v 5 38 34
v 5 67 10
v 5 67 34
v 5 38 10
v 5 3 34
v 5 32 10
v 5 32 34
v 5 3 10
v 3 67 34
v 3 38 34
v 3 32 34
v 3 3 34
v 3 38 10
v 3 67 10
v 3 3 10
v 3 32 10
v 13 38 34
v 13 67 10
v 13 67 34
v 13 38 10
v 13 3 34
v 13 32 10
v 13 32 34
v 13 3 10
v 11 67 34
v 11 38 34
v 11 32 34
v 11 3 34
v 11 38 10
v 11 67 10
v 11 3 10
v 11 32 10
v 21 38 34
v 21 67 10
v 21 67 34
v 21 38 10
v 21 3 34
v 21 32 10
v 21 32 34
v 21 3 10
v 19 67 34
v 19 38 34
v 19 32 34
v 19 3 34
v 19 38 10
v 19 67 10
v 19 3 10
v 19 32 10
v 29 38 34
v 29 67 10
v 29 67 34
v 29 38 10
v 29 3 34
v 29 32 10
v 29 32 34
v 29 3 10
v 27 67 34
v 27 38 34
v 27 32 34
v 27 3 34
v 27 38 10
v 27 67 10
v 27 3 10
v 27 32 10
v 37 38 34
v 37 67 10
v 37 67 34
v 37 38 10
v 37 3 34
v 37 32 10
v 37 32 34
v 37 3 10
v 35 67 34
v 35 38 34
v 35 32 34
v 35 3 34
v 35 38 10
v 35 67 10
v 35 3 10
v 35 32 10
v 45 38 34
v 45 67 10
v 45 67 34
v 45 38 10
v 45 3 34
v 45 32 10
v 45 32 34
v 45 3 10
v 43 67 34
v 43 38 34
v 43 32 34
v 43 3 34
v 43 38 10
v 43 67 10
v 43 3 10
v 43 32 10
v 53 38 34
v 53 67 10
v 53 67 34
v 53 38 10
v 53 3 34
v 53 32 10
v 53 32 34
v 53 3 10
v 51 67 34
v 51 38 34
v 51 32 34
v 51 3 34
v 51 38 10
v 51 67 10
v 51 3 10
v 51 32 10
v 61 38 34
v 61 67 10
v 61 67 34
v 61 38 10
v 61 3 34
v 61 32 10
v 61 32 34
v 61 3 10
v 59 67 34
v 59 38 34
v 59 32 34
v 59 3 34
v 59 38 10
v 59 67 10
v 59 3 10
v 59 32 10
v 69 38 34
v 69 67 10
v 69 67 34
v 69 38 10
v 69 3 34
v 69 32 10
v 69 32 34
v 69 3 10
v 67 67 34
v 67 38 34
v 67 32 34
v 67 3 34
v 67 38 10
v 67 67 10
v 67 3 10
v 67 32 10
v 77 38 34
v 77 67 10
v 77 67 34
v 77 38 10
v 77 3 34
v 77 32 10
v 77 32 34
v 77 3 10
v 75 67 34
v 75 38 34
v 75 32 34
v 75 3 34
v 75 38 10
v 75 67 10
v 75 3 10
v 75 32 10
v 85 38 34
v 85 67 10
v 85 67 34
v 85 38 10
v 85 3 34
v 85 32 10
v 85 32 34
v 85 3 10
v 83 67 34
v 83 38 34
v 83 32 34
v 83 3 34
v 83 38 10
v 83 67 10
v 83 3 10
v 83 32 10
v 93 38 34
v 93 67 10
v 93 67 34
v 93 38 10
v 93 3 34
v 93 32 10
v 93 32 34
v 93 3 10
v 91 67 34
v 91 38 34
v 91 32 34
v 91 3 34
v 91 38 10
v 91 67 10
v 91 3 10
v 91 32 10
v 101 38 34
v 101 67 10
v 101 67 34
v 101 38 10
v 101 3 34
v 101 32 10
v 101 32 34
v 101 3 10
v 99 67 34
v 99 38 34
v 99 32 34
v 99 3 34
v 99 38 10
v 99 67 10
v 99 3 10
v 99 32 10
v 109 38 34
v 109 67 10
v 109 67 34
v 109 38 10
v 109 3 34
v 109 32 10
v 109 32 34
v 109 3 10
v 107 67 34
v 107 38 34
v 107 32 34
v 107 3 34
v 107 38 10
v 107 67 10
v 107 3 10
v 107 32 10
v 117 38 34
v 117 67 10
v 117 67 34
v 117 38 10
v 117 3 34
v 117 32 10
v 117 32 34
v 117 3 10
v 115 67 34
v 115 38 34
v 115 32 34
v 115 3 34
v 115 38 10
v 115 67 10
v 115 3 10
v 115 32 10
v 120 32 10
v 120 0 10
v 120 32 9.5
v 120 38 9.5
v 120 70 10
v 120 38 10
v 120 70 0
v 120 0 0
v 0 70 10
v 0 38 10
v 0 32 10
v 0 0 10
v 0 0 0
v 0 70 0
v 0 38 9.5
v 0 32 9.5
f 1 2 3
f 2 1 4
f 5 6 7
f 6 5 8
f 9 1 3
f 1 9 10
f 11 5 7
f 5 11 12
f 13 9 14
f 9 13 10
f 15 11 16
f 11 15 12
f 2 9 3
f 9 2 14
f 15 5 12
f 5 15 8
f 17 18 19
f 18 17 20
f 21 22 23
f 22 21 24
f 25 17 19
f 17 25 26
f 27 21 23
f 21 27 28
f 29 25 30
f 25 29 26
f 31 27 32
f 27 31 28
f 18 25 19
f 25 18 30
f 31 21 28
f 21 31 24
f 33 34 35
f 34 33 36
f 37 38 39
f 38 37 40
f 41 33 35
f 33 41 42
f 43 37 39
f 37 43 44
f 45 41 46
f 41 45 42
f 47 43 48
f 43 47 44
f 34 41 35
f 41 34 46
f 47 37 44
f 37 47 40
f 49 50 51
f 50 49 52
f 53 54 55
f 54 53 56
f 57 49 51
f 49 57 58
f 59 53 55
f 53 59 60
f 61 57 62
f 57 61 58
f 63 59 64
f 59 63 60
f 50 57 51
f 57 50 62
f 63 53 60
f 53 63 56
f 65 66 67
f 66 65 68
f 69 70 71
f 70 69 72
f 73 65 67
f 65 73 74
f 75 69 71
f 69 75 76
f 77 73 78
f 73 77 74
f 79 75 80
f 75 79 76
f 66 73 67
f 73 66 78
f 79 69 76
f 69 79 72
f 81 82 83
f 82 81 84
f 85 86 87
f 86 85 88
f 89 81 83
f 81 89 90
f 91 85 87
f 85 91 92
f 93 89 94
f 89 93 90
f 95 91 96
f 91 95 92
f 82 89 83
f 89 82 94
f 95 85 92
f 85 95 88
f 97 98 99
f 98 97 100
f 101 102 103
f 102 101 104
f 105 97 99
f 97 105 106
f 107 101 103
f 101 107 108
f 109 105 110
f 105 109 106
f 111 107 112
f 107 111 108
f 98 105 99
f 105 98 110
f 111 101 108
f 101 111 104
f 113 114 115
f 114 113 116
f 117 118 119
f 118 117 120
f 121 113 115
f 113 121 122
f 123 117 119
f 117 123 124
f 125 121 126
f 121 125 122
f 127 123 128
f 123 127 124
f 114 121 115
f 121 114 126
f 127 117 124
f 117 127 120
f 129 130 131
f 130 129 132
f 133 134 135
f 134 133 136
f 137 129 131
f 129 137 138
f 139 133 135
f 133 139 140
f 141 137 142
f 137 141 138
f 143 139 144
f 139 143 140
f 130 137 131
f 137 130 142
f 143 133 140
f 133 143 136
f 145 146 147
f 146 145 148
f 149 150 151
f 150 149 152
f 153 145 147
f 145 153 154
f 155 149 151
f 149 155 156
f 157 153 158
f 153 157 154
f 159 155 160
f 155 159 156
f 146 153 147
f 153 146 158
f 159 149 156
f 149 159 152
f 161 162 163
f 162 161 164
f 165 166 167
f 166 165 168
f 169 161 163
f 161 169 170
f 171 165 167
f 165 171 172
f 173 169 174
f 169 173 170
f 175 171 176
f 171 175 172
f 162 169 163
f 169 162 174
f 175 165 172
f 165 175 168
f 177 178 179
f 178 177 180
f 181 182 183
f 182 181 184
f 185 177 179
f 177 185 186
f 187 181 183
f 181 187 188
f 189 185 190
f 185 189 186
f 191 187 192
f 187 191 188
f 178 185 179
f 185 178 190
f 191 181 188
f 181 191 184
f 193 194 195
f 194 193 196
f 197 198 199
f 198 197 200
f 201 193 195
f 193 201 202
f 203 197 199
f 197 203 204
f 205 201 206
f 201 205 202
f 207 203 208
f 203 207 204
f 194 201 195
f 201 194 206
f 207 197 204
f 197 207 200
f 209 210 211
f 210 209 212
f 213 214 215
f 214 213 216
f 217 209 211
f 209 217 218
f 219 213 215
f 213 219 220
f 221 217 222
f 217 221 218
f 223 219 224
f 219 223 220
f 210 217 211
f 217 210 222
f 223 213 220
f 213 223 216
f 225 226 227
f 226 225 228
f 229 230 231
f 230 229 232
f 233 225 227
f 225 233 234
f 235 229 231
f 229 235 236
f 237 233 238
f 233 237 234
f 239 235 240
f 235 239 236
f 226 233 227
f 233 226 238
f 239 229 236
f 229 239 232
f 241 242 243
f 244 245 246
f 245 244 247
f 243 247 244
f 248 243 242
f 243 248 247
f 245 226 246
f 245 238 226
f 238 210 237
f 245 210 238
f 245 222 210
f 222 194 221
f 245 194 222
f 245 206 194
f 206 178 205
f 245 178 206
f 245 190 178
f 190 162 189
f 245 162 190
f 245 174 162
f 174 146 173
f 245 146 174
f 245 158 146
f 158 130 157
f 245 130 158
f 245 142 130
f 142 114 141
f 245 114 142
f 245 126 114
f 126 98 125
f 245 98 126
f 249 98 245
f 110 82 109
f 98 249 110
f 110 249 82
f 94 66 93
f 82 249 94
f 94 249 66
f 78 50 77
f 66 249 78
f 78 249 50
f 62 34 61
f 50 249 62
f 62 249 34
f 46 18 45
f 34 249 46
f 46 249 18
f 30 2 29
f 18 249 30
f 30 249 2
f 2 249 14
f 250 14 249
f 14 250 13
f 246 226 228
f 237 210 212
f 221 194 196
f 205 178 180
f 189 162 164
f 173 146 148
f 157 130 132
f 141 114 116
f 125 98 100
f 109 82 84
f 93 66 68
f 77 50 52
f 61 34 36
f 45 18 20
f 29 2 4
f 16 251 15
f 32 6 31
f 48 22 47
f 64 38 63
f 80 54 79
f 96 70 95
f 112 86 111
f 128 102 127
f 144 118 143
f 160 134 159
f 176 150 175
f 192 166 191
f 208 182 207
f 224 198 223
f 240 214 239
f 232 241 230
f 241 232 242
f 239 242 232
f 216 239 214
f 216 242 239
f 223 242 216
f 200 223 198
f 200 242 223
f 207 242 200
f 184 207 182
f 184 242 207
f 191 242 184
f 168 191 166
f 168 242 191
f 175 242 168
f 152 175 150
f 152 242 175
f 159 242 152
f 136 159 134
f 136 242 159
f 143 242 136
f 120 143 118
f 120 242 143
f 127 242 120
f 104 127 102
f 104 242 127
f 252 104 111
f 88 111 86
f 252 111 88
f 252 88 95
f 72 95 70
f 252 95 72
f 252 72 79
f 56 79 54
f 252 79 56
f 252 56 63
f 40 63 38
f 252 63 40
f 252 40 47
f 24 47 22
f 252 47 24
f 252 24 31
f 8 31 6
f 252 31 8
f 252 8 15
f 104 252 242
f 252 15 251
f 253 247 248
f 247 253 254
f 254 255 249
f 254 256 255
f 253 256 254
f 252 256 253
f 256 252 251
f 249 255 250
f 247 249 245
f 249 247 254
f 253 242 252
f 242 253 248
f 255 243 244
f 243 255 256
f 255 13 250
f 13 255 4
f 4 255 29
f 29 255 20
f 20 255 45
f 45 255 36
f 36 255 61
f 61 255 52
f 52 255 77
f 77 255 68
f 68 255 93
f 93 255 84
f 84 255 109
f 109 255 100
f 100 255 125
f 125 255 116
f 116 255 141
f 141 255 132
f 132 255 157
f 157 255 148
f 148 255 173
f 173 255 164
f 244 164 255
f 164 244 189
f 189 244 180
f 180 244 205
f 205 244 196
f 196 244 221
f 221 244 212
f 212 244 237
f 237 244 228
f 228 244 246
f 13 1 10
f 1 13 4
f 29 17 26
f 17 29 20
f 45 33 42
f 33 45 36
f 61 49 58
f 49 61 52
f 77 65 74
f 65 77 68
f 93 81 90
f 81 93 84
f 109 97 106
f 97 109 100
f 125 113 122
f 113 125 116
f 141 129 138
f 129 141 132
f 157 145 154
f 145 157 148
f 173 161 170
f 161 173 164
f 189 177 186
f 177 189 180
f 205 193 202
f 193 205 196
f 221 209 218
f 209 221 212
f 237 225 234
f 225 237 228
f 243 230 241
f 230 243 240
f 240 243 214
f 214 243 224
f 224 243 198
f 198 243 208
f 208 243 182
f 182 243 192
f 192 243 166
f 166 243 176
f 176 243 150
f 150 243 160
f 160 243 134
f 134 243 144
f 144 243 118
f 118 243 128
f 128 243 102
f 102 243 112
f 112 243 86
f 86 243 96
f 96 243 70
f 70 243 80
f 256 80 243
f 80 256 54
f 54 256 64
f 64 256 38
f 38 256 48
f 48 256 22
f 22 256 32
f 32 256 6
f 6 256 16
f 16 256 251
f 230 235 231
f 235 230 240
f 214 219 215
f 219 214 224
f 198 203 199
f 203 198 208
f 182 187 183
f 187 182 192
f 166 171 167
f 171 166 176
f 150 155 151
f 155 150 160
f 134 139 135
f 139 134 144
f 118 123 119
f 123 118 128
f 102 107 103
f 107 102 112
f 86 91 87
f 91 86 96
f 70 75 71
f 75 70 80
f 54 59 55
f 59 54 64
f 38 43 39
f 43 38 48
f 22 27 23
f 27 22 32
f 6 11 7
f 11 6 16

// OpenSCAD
$fn = 32;

// ----------------------------------------------------------------------
// Heatsink: slotted fin block
// ----------------------------------------------------------------------

// --- parameters (mm) ---
base_l = 120;             // base length, X
base_w = 70;              // base width, Y
base_t = 10;              // base plate thickness
fin_h = 25;               // fin height above the base
fin_t = 2;                // fin thickness
edge = 3;                 // margin from the base ends
pitch = 8;                // fin pitch
slot_w = 6;               // central slot width, Y
fit_tol = 0.1;            // tolerance for press fits, mm
free_tol = 0.5;           // tolerance for clearance fits, mm

n_fins = floor((base_l - 2 * edge - fin_t) / pitch) + 1;  // fin count
total_h = base_t + fin_h - 1;  // overall height

difference() {
union() {
  cube([base_l, base_w, base_t]);
  for (i = [0 : n_fins - 1])
    translate([edge + i * pitch, edge, base_t - 1])
      cube([fin_t, base_w - 2 * edge, fin_h]);
}
  translate([-1, base_w / 2 - slot_w / 2, base_t - 0.5])
    cube([base_l + 2, slot_w, fin_h + 2]);
}
